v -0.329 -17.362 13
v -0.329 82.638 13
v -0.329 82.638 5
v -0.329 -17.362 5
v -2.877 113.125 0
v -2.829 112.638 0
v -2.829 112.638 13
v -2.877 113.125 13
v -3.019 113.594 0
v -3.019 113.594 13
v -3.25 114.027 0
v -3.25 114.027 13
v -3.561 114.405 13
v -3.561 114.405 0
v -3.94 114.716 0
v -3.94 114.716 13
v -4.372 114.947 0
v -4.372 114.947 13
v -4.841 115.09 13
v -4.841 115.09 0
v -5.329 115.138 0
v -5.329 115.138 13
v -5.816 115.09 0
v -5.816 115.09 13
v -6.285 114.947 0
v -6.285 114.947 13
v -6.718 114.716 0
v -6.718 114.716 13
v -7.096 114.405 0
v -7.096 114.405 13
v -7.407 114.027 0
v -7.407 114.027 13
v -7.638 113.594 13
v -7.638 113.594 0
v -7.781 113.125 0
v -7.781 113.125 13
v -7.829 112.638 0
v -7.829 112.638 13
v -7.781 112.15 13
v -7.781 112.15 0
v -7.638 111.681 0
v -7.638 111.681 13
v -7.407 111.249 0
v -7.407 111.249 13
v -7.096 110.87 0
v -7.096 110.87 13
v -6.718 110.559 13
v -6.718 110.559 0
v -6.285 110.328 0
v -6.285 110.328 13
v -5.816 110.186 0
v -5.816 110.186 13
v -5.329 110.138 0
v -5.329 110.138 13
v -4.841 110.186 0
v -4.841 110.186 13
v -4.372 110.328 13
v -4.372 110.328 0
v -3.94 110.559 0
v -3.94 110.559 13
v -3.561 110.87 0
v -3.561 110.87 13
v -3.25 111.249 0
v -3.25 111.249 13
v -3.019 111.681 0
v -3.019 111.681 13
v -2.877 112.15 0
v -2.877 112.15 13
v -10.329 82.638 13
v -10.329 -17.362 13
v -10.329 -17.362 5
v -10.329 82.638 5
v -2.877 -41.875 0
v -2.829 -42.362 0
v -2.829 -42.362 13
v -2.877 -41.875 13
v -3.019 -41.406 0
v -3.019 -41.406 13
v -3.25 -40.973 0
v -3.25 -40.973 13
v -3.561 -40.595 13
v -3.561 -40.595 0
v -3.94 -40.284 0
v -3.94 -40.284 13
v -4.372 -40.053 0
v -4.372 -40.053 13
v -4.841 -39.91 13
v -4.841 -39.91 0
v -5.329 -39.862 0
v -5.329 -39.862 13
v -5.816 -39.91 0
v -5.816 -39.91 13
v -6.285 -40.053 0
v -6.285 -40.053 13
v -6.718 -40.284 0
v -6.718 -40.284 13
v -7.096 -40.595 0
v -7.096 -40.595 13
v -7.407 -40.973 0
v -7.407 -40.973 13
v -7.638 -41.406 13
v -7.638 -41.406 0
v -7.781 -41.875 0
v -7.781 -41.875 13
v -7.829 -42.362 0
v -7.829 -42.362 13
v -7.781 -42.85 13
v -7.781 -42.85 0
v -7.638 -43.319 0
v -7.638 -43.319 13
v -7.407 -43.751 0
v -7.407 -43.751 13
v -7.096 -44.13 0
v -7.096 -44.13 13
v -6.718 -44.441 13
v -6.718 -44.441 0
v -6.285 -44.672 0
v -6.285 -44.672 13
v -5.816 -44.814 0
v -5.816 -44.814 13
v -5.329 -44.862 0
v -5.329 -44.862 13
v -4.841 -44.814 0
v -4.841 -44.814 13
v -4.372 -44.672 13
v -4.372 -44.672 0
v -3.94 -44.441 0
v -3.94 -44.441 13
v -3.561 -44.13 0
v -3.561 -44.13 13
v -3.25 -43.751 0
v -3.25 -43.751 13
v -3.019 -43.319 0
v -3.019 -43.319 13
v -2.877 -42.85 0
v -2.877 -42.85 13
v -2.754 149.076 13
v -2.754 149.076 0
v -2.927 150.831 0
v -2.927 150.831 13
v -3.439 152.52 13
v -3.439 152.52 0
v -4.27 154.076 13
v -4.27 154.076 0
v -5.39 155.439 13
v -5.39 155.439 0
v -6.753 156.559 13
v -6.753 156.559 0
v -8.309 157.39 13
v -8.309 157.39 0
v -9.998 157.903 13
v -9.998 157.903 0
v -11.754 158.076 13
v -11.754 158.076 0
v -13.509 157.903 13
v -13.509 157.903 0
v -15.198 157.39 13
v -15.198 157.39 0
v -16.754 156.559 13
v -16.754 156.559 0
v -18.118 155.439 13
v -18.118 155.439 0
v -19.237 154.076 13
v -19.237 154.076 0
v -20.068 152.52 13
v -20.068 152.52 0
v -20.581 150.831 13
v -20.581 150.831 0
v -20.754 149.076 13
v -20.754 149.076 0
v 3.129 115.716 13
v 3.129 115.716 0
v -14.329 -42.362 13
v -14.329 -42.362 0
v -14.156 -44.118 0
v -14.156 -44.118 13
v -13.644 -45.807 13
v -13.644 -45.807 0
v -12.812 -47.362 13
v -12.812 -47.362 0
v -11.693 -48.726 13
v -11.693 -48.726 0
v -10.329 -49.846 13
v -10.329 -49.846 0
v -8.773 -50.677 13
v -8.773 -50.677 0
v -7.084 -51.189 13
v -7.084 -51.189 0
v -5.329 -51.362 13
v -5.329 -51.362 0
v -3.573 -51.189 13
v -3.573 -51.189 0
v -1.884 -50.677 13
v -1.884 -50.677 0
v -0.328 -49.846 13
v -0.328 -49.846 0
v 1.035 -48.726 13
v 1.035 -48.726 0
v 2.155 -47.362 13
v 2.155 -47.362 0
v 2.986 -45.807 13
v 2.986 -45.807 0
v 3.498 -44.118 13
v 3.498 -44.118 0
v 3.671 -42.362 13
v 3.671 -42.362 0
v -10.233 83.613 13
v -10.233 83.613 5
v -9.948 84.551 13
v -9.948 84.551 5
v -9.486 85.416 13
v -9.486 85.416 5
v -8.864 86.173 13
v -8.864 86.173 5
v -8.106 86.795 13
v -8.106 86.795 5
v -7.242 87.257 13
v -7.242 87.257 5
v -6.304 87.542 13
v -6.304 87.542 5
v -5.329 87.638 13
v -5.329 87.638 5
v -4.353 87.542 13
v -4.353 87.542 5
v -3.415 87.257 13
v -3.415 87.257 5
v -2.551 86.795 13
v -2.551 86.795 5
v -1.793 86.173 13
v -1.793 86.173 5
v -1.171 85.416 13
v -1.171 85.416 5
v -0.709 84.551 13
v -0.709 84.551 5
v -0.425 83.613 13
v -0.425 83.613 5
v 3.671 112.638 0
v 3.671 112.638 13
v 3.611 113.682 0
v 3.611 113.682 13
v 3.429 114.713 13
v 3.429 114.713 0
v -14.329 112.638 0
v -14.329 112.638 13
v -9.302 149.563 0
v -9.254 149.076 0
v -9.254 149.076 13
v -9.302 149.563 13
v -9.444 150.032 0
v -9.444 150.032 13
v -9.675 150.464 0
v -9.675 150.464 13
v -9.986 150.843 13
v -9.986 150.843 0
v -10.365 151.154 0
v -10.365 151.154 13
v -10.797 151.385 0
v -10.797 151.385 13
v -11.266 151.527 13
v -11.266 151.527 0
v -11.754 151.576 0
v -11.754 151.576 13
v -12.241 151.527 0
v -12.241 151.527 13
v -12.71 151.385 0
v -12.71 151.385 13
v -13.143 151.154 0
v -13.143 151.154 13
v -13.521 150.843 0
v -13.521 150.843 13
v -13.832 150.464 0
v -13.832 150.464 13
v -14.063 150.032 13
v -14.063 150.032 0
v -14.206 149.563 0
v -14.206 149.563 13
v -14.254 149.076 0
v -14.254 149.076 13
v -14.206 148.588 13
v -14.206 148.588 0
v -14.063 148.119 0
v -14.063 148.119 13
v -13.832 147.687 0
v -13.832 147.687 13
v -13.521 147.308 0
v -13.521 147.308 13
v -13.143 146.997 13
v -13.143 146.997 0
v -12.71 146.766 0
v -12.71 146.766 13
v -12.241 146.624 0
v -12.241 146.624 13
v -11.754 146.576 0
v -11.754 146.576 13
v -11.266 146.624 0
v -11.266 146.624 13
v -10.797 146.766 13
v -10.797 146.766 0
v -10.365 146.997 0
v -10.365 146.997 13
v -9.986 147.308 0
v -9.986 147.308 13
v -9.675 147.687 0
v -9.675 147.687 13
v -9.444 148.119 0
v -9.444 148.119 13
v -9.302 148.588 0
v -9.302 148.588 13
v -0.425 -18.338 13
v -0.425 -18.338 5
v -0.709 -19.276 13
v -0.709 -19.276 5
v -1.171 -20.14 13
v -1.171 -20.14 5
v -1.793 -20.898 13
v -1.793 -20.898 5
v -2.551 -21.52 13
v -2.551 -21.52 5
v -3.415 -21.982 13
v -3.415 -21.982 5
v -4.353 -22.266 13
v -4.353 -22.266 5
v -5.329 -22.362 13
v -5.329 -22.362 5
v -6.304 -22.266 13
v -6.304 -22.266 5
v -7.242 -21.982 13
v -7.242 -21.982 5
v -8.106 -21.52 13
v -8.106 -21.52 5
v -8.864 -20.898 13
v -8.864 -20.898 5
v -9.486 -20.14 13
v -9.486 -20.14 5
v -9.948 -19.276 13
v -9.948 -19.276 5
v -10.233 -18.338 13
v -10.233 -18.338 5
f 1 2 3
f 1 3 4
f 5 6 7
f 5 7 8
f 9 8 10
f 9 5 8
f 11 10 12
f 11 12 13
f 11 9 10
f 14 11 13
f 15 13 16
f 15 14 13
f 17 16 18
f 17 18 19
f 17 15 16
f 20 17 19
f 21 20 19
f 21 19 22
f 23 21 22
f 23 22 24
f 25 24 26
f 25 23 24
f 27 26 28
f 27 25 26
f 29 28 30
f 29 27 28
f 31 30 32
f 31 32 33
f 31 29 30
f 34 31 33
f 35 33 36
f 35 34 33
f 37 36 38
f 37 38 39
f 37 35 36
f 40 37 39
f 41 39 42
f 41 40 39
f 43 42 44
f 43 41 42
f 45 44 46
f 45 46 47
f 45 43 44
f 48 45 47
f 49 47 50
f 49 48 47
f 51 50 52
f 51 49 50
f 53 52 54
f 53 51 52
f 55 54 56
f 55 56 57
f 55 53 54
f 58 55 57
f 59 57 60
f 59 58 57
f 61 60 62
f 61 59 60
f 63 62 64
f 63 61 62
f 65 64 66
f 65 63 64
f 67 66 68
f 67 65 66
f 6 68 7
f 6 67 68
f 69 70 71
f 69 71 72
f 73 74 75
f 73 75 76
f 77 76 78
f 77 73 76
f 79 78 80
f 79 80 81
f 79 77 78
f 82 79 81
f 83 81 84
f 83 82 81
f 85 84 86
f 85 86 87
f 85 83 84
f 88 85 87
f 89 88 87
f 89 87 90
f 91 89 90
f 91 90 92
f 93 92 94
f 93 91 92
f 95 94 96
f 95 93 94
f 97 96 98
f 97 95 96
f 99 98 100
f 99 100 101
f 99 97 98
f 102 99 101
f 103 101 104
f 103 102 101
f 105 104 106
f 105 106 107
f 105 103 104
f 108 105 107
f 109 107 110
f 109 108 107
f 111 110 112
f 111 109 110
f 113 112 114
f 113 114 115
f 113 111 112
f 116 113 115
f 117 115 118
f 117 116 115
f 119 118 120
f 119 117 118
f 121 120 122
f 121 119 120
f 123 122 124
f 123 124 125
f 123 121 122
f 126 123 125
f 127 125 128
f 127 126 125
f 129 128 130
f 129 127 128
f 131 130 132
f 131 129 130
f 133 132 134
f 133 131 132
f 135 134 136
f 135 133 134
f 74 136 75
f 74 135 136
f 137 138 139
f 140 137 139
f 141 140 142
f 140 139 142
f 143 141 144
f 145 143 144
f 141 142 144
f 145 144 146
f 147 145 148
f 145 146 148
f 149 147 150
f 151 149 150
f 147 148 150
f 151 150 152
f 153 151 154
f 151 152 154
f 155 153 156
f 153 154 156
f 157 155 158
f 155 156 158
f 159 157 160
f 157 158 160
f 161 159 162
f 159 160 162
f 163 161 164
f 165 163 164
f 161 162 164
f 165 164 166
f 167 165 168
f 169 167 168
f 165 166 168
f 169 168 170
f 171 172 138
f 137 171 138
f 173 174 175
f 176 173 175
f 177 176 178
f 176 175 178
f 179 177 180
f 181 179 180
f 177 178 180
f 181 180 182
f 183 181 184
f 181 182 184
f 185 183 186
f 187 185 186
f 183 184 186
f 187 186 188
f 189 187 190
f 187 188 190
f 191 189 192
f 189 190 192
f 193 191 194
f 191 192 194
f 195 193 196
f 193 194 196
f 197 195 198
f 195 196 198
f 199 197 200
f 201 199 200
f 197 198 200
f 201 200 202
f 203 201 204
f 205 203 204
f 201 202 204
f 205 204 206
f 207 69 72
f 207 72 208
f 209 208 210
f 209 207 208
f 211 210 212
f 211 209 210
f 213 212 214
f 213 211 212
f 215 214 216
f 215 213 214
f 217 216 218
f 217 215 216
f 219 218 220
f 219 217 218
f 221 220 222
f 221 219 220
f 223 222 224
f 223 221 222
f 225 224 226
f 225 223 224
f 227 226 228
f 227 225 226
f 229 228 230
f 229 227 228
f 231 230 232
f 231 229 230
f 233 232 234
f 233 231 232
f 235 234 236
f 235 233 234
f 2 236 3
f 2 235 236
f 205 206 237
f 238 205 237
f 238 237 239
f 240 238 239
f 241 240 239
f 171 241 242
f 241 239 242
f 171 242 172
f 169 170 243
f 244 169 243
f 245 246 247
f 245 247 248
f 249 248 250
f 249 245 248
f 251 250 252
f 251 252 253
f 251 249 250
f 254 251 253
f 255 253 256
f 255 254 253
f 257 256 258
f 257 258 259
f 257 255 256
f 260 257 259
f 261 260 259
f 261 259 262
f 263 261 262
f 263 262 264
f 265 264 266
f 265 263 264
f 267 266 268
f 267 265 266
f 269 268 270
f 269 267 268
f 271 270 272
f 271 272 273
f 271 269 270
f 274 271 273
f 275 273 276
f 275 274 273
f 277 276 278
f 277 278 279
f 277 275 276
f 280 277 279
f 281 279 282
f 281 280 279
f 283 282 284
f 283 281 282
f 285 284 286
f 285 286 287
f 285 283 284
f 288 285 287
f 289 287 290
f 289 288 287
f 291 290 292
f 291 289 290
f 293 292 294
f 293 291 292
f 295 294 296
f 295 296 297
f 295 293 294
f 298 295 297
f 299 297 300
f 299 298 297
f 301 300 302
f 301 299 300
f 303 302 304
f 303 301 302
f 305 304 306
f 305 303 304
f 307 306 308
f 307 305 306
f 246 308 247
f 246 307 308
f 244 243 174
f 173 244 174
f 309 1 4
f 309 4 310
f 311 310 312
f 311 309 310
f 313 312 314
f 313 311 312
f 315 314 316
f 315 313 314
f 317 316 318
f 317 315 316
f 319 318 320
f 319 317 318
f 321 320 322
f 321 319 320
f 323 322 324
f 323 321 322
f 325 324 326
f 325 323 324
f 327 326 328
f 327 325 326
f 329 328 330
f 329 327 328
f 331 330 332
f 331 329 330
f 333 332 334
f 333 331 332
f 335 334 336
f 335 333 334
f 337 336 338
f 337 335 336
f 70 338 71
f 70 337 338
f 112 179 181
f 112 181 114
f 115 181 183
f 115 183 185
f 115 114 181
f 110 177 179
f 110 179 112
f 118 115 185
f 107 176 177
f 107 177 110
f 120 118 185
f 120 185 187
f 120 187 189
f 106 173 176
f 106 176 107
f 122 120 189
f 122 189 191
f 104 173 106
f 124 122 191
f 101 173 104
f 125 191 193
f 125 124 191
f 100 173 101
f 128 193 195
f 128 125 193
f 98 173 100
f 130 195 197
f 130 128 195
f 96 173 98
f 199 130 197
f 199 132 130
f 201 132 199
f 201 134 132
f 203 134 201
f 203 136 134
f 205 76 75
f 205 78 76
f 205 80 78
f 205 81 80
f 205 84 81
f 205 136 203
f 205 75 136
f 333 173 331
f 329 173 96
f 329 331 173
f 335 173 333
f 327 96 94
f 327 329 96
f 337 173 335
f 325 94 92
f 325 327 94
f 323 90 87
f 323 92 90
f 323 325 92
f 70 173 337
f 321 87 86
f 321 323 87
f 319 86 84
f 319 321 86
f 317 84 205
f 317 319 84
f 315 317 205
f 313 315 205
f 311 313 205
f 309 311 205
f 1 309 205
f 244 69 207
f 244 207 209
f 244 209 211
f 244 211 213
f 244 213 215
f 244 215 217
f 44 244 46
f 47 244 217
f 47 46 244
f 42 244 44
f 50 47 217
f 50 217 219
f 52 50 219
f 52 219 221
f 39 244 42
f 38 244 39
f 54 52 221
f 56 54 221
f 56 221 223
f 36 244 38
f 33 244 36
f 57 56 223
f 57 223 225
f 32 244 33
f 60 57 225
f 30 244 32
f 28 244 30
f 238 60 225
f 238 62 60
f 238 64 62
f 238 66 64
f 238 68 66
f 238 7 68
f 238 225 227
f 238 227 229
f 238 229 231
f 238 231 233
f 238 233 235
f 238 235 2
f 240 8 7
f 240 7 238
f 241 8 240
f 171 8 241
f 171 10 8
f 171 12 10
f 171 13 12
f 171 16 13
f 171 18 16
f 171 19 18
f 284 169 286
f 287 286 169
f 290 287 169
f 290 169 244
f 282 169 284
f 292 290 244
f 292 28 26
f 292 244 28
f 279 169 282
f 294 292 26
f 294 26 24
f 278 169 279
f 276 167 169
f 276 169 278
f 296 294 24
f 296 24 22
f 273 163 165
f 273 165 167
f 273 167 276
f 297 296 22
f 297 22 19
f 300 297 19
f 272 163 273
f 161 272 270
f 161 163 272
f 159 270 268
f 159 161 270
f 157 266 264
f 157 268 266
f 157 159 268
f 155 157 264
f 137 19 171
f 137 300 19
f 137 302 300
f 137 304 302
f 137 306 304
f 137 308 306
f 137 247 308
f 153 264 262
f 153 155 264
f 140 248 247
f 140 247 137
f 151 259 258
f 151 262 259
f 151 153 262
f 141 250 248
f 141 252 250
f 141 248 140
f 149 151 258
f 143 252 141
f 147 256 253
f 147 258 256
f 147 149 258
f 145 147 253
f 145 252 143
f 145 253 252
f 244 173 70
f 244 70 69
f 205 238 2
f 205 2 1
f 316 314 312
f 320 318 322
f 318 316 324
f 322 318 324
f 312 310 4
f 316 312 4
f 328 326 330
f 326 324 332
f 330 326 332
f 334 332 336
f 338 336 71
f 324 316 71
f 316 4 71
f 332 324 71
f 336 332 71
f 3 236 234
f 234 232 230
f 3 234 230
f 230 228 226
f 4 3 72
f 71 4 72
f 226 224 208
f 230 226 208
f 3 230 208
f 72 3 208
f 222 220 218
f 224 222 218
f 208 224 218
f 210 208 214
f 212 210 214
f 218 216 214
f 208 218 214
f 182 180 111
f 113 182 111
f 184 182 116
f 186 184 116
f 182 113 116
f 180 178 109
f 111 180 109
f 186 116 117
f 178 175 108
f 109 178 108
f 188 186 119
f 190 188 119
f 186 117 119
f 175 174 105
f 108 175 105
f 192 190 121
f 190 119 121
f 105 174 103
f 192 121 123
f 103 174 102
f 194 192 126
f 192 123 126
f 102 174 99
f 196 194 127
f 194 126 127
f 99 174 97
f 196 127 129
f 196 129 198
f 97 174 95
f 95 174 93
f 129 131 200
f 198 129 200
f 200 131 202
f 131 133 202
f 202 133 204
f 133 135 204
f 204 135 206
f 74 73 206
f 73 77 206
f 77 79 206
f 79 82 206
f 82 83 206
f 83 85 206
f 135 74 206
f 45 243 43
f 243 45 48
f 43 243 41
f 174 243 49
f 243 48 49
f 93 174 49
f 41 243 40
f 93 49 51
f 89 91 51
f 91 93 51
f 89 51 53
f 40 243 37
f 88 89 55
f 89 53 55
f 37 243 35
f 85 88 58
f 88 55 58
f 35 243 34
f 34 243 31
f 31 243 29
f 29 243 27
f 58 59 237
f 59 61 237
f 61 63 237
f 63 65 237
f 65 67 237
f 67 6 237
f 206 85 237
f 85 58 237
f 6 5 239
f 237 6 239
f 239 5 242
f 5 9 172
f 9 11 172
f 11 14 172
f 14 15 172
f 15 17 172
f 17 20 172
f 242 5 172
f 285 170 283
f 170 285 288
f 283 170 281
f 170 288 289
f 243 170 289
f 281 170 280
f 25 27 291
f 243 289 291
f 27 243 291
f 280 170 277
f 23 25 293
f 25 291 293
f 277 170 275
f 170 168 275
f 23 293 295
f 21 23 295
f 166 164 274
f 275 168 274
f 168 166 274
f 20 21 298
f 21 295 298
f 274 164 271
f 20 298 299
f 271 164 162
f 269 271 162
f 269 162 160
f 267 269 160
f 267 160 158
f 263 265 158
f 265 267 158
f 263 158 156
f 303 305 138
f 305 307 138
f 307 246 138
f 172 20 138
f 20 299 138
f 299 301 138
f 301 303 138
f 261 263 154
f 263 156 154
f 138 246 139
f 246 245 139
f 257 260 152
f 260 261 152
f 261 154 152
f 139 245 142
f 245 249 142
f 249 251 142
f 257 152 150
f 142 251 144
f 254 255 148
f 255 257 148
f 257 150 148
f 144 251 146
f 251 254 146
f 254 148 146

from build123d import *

# Parameters (mm, degrees)
SKETCH1_R      = 2.5
EXTRUDE1_DEPTH = 13
EXTRUDE2_DEPTH = 8


with BuildPart() as part:
    # Sketch1 → Extrude1 (new body)
    with BuildSketch(Plane.XY):
        with BuildLine():
            Line((-14.328597561, 112.637649389), (-14.328597561, -42.362350611))
            ThreePointArc((-14.328597561, -42.362350611), (-5.328597561, -51.362350611), (3.671402439, -42.362350611))
            Line((3.671402439, -42.362350611), (3.671402439, 112.637649389))
            ThreePointArc((3.671402439, 112.637649389), (3.534672216, 114.200482988), (3.128636026, 115.715830679))
            Line((3.128636026, 115.715830679), (-2.753580135, 149.07553625))
            ThreePointArc((-2.753580135, 149.07553625), (-11.753580135, 158.07553625), (-20.753580135, 149.07553625))
            Line((-20.753580135, 149.07553625), (-14.328597561, 112.637649389))
        make_face()
        with Locations((-5.328597561, 112.637649389)):
            Circle(SKETCH1_R, mode=Mode.SUBTRACT)
        with Locations((-5.328597561, -42.362350611)):
            Circle(SKETCH1_R, mode=Mode.SUBTRACT)
        with Locations((-11.753580135, 149.07553625)):
            Circle(SKETCH1_R, mode=Mode.SUBTRACT)
    extrude(amount=EXTRUDE1_DEPTH)

    # Sketch2 → Extrude2 (cut)
    with BuildSketch(Plane.XY.offset(13)):
        with BuildLine():
            Line((-0.328597561, 82.637649389), (-0.328597561, -17.362350611))
            ThreePointArc((-0.328597561, -17.362350611), (-5.328597561, -22.362350611), (-10.328597561, -17.362350611))
            Line((-10.328597561, -17.362350611), (-10.328597561, 82.637649389))
            ThreePointArc((-10.328597561, 82.637649389), (-5.328597561, 87.637649389), (-0.328597561, 82.637649389))
        make_face()
    extrude(amount=-EXTRUDE2_DEPTH, mode=Mode.SUBTRACT)


solid = part.part
